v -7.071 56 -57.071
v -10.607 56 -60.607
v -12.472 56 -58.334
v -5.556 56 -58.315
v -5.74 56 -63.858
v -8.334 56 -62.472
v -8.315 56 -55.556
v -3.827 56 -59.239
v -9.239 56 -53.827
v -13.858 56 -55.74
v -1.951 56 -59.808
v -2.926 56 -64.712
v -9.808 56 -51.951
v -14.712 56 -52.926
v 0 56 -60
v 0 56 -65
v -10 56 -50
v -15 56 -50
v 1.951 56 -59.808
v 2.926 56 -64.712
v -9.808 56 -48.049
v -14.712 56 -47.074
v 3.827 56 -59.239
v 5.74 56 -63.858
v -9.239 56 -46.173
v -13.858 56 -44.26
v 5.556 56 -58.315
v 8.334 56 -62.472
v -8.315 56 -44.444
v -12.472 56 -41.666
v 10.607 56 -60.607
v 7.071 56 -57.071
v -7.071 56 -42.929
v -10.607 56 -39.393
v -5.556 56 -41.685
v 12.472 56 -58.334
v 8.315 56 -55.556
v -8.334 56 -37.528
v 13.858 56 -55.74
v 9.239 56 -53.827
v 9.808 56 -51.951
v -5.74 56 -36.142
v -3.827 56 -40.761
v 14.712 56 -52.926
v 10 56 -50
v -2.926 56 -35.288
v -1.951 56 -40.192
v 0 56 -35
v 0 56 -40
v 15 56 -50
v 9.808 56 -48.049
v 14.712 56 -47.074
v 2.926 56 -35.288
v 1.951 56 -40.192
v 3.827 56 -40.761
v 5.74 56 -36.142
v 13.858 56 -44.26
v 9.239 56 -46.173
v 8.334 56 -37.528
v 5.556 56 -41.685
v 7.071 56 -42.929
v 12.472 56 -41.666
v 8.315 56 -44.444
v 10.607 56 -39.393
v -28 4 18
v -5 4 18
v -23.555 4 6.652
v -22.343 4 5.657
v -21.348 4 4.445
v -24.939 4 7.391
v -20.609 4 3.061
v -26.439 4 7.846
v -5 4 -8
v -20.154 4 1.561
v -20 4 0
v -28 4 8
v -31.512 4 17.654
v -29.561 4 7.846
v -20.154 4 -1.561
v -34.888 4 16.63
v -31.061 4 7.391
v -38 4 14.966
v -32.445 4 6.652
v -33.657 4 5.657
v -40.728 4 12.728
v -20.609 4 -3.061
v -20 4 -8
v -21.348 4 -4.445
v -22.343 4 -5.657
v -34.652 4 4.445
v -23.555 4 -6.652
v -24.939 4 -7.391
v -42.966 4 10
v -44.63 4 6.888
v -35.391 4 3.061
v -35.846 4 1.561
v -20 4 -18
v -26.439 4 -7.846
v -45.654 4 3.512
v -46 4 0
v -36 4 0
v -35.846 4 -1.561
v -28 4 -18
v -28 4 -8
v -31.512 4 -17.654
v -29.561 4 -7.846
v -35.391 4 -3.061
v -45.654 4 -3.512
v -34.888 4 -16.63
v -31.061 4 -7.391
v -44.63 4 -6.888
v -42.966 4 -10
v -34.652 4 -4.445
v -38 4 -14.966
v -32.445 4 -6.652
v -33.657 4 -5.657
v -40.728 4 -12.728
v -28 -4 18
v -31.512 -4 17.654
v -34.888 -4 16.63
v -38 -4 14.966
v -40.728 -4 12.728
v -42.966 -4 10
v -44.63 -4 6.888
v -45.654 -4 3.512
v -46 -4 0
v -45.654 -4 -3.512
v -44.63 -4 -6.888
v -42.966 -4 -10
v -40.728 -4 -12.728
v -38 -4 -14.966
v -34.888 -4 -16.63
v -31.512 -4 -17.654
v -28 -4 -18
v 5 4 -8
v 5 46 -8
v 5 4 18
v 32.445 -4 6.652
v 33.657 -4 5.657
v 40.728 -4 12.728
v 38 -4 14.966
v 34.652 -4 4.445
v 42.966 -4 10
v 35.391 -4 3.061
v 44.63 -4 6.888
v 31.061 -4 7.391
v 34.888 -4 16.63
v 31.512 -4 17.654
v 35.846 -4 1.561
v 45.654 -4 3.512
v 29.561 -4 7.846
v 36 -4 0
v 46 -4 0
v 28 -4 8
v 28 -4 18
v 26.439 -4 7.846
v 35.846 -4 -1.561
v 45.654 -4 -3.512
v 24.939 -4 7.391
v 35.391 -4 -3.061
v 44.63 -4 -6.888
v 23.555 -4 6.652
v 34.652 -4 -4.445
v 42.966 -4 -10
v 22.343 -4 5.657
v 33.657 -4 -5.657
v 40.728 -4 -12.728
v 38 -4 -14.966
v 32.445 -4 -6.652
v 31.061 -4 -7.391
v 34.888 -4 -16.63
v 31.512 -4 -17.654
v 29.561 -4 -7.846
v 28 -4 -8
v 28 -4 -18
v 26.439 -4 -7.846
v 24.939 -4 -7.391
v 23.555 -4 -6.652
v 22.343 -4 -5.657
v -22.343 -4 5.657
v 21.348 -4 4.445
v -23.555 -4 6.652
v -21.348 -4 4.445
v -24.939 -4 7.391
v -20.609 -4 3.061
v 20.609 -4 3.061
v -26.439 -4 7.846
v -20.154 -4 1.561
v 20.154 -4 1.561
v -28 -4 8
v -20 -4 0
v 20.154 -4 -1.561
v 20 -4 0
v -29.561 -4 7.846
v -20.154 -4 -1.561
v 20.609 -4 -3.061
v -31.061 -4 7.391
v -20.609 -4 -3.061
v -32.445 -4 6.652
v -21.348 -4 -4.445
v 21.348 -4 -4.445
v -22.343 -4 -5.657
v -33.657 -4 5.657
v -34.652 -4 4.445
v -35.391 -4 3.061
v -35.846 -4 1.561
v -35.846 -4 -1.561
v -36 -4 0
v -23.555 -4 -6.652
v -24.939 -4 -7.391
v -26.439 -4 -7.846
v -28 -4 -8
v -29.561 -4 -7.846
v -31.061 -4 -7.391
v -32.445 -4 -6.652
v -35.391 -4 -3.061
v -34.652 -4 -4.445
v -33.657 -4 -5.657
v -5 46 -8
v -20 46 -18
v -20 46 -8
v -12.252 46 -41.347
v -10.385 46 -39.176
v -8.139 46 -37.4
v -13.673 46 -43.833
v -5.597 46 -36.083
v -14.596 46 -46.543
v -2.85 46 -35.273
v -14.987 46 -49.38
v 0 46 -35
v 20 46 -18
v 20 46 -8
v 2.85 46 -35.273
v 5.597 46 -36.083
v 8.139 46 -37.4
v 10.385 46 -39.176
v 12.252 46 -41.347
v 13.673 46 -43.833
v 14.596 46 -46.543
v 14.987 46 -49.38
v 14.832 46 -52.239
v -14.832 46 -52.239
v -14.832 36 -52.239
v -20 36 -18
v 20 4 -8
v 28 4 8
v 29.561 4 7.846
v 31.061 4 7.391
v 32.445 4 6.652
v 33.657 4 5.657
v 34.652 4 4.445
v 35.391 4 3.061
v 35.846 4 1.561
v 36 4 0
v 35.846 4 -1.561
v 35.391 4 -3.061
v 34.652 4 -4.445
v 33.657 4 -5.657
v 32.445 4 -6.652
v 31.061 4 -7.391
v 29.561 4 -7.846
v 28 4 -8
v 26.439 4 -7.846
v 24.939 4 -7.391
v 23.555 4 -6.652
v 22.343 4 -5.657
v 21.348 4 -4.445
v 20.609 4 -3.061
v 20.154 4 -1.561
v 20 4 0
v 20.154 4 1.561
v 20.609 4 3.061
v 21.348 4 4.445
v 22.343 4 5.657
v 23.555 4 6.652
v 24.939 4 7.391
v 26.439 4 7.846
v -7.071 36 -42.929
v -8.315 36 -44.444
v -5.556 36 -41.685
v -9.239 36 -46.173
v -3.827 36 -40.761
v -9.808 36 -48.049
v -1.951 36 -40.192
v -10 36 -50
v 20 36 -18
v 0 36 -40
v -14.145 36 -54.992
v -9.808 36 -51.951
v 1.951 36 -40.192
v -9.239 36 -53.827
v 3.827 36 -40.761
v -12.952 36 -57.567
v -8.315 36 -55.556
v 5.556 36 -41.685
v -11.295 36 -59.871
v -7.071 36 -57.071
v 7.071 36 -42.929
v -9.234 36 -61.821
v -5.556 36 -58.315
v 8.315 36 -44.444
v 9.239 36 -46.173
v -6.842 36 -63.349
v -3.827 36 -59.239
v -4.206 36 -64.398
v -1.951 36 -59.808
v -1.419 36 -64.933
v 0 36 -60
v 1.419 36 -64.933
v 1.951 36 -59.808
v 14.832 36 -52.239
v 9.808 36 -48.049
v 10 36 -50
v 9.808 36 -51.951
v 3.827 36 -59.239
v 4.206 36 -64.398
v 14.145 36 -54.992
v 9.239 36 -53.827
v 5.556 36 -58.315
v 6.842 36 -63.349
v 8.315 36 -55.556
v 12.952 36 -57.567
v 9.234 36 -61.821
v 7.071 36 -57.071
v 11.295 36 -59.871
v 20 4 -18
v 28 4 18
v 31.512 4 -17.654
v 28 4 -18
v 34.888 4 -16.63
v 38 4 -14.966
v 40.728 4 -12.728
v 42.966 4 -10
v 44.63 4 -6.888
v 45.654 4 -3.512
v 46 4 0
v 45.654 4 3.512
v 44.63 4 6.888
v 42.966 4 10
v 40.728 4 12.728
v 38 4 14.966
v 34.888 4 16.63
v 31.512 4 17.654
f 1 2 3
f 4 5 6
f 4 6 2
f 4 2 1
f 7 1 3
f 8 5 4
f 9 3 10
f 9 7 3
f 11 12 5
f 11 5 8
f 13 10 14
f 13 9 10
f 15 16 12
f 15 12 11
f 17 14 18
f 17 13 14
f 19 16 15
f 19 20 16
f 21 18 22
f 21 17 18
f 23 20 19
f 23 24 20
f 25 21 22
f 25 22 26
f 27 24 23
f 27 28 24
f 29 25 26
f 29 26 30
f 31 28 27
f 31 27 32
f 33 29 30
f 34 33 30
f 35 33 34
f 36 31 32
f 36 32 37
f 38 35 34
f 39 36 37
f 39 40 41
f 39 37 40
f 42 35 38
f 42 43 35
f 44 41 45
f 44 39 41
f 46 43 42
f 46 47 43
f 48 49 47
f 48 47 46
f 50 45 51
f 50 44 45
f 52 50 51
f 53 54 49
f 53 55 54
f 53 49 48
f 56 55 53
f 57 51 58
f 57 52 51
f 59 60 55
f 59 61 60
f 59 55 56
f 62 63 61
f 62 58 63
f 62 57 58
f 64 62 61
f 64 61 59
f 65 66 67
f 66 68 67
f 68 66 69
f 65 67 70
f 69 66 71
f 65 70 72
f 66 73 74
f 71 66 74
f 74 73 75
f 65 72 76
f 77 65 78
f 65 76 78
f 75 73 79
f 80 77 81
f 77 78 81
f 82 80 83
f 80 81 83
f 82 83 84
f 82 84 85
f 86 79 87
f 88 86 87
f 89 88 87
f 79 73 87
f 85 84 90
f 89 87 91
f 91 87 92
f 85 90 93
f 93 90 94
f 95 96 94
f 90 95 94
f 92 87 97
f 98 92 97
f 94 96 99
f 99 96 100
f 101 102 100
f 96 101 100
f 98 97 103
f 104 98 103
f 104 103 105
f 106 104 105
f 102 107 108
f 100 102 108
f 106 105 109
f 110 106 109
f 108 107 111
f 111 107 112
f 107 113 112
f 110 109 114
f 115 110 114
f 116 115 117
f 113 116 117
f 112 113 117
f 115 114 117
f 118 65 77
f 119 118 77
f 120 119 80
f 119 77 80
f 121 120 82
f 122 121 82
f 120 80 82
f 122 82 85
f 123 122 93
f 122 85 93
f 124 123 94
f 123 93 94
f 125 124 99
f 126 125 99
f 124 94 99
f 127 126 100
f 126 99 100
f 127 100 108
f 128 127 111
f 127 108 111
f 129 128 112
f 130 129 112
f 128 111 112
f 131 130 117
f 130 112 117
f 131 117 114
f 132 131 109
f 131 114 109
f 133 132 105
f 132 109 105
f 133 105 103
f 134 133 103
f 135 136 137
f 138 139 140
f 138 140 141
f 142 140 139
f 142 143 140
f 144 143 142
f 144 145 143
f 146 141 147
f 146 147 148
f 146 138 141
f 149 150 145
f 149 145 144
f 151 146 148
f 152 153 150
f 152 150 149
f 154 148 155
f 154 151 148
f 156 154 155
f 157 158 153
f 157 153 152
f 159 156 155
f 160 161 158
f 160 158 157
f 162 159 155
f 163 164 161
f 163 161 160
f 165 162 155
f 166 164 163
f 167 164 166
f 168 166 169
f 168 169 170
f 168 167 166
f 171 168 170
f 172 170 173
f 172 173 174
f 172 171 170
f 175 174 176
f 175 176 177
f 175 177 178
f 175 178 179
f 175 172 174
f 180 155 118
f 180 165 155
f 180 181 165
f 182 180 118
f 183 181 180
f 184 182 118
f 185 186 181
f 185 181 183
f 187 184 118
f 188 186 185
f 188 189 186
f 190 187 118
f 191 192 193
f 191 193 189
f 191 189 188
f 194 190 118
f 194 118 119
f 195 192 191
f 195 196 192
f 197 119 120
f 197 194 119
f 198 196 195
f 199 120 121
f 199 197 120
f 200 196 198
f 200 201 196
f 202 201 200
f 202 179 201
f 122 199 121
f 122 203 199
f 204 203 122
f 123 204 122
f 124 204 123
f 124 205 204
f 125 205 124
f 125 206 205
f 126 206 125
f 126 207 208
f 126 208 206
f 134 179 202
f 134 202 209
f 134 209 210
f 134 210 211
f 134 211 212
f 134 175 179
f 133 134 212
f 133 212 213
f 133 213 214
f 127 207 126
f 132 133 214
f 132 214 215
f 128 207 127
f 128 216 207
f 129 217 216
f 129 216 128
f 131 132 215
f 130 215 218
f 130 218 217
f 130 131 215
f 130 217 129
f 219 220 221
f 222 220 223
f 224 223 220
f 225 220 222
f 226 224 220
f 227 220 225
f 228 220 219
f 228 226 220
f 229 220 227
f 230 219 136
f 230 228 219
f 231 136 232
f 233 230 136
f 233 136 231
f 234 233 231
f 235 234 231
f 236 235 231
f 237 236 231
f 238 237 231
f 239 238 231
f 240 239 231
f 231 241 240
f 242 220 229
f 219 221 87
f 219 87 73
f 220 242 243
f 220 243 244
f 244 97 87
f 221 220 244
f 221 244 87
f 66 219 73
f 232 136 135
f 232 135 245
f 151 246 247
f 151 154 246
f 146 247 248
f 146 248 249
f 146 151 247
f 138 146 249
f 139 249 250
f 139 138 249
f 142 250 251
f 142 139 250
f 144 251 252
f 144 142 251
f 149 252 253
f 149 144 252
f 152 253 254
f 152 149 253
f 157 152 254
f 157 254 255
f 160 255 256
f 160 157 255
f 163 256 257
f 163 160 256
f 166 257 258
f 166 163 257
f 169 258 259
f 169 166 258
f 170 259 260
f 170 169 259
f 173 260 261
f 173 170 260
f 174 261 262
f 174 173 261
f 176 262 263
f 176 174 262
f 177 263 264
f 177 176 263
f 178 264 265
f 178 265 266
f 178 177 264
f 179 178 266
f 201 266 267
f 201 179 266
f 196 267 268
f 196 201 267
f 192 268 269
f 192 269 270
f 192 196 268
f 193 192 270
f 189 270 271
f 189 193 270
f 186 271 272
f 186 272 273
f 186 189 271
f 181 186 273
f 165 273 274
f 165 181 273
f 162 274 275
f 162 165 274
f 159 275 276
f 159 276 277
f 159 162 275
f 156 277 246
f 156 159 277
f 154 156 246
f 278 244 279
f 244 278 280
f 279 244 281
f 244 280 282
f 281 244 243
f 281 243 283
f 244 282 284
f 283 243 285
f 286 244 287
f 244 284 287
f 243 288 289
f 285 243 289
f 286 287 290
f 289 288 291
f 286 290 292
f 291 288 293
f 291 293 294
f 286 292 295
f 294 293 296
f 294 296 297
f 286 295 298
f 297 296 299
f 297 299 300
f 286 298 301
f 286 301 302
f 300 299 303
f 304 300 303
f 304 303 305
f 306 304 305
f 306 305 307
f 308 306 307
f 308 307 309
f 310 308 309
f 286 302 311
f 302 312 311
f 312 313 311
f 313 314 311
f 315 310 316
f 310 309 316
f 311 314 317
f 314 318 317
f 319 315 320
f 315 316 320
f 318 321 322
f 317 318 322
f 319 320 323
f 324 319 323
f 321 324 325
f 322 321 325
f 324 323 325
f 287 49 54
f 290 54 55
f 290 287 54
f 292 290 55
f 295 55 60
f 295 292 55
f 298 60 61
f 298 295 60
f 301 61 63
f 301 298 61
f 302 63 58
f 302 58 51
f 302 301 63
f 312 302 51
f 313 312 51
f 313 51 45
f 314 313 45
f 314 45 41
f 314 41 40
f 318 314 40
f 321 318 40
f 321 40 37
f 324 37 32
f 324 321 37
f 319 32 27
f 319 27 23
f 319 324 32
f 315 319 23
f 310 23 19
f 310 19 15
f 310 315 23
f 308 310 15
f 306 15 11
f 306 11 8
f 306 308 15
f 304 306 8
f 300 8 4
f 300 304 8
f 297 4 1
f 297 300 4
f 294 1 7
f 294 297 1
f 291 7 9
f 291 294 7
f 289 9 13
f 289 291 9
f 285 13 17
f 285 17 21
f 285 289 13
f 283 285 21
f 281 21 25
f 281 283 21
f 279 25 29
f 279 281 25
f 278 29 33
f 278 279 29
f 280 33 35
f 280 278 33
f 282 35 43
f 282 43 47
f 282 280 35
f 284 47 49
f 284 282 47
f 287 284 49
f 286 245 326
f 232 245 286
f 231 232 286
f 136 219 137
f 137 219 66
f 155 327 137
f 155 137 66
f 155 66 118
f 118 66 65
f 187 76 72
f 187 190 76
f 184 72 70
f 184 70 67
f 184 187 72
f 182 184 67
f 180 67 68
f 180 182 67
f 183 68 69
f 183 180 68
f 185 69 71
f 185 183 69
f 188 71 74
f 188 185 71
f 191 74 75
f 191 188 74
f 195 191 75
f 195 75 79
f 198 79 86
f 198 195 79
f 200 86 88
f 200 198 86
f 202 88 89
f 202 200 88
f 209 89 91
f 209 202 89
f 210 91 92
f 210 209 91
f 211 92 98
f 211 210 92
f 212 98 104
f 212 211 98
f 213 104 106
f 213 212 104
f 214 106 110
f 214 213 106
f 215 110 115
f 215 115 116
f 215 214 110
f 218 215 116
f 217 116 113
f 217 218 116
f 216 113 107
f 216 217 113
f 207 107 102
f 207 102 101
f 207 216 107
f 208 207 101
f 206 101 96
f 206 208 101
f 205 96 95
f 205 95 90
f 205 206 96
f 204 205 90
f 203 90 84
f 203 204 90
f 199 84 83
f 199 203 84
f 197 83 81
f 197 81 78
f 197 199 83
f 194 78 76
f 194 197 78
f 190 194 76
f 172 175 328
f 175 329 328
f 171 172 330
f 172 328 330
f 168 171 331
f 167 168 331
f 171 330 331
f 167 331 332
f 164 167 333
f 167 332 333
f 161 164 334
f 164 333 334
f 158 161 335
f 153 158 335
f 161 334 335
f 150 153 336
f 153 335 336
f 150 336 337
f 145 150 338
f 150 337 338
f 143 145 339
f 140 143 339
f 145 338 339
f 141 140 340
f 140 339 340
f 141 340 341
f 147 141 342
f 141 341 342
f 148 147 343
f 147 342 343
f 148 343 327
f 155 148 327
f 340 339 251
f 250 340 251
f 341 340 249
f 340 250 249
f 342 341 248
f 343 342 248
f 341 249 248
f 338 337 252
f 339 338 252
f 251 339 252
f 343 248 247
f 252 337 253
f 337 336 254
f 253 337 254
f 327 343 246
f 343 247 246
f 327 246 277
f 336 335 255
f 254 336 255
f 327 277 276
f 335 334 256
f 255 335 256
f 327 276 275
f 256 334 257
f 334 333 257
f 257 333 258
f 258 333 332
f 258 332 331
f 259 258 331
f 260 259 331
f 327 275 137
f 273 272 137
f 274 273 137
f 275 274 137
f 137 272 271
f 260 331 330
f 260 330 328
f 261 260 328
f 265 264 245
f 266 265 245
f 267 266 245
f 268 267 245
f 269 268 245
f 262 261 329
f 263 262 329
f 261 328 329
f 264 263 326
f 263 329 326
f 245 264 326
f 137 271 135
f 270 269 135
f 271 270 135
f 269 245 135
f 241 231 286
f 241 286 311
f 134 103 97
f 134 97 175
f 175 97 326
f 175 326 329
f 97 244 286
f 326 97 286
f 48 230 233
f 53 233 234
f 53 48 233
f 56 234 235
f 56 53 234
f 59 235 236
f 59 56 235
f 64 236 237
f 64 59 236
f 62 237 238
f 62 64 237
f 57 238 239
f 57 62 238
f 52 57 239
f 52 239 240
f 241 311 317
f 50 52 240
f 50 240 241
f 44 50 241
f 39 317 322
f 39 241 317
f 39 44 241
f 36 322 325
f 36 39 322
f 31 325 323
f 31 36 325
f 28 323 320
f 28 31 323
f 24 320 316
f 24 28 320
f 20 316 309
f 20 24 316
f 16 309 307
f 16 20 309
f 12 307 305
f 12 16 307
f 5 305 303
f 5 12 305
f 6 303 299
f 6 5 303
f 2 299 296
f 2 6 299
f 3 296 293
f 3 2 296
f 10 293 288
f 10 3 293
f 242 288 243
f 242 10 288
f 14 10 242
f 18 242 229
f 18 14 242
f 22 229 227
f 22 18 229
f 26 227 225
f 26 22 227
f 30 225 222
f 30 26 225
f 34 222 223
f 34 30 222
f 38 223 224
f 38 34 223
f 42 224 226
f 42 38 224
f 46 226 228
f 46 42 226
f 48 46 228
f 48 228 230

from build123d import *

# Parameters (mm, degrees)
SKETCH1_R           = 8
BOSS_EXTRUDE1_DEPTH = 4
SKETCH2_W           = 40
SKETCH2_H           = 10
BOSS_EXTRUDE2_DEPTH = 32
SKETCH3_R           = 15
SKETCH3_R_2         = 10
BOSS_EXTRUDE3_DEPTH = 10
BOSS_EXTRUDE4_DEPTH = 10
RIB6_REACH          = 99.35
SKETCH5_WALL_W      = 246.096125016
SKETCH5_WALL_H      = 10


with BuildPart() as part:
    # Sketch1 → Boss-Extrude1 (new, symmetric)
    with BuildSketch(Plane(origin=(0, 0, 0), x_dir=(1, 0, 0), z_dir=(0, 1, 0))):
        with BuildLine():
            Line((-28, 18), (28, 18))
            ThreePointArc((28, 18), (46, 0), (28, -18))
            Line((28, -18), (-28, -18))
            ThreePointArc((-28, -18), (-46, 0), (-28, 18))
        make_face()
        with Locations(Location((-28, 0, 0), (0, 0, 270))):
            Circle(SKETCH1_R, mode=Mode.SUBTRACT)
        with Locations(Location((28, 0, 0), (0, 0, 270))):
            Circle(SKETCH1_R, mode=Mode.SUBTRACT)
    extrude(amount=BOSS_EXTRUDE1_DEPTH, both=True)

    # Sketch2 → Boss-Extrude2 (add)
    with BuildSketch(Plane(origin=(0, 4, 0), x_dir=(1, 0, 0), z_dir=(0, 1, 0))):
        with Locations((0, 13)):
            Rectangle(SKETCH2_W, SKETCH2_H)
    extrude(amount=BOSS_EXTRUDE2_DEPTH)



with BuildPart() as body_2:
    # Sketch3 → Boss-Extrude3 (new, symmetric)
    with BuildSketch(Plane(origin=(0, 46, 0), x_dir=(1, 0, 0), z_dir=(0, 1, 0))):
        with Locations(Location((0, 50, 0), (0, 0, 270))):
            Circle(SKETCH3_R)
        with Locations(Location((0, 50, 0), (0, 0, 270))):
            Circle(SKETCH3_R_2, mode=Mode.SUBTRACT)
    extrude(amount=BOSS_EXTRUDE3_DEPTH, both=True)


with BuildPart() as part_1:
    add(part.part)

    add(body_2.part)  # Boss-Extrude4 merges body 2
    # Sketch4 → Boss-Extrude4 (add)
    with BuildSketch(Plane(origin=(0, 46, 0), x_dir=(1, 0, 0), z_dir=(0, 1, 0))):
        with BuildLine():
            Line((20, 8), (20, 18))
            Line((20, 18), (14.831993052, 52.238745657))
            ThreePointArc((14.831993052, 52.238745657), (0, 35), (-14.831993052, 52.238745657))
            Line((-14.831993052, 52.238745657), (-20, 18))
            Line((-20, 18), (-20, 8))
            Line((-20, 8), (20, 8))
        make_face()
    extrude(amount=-BOSS_EXTRUDE4_DEPTH)

    # Sketch5 wall → Rib6 (add, up to next)
    with BuildSketch(Plane(origin=(0, 25, 5), x_dir=(0, -0.850265146688, 0.526354614616), z_dir=(0, -0.526354614616, -0.850265146688)), mode=Mode.PRIVATE) as rib6_sk1:
        Rectangle(SKETCH5_WALL_W, SKETCH5_WALL_H)
    rib6_tool1 = extrude(rib6_sk1.sketch, amount=RIB6_REACH, mode=Mode.PRIVATE) - part_1.part
    add(rib6_tool1.solids().sort_by_distance((0, 25, 5))[0])


solid = part_1.part
